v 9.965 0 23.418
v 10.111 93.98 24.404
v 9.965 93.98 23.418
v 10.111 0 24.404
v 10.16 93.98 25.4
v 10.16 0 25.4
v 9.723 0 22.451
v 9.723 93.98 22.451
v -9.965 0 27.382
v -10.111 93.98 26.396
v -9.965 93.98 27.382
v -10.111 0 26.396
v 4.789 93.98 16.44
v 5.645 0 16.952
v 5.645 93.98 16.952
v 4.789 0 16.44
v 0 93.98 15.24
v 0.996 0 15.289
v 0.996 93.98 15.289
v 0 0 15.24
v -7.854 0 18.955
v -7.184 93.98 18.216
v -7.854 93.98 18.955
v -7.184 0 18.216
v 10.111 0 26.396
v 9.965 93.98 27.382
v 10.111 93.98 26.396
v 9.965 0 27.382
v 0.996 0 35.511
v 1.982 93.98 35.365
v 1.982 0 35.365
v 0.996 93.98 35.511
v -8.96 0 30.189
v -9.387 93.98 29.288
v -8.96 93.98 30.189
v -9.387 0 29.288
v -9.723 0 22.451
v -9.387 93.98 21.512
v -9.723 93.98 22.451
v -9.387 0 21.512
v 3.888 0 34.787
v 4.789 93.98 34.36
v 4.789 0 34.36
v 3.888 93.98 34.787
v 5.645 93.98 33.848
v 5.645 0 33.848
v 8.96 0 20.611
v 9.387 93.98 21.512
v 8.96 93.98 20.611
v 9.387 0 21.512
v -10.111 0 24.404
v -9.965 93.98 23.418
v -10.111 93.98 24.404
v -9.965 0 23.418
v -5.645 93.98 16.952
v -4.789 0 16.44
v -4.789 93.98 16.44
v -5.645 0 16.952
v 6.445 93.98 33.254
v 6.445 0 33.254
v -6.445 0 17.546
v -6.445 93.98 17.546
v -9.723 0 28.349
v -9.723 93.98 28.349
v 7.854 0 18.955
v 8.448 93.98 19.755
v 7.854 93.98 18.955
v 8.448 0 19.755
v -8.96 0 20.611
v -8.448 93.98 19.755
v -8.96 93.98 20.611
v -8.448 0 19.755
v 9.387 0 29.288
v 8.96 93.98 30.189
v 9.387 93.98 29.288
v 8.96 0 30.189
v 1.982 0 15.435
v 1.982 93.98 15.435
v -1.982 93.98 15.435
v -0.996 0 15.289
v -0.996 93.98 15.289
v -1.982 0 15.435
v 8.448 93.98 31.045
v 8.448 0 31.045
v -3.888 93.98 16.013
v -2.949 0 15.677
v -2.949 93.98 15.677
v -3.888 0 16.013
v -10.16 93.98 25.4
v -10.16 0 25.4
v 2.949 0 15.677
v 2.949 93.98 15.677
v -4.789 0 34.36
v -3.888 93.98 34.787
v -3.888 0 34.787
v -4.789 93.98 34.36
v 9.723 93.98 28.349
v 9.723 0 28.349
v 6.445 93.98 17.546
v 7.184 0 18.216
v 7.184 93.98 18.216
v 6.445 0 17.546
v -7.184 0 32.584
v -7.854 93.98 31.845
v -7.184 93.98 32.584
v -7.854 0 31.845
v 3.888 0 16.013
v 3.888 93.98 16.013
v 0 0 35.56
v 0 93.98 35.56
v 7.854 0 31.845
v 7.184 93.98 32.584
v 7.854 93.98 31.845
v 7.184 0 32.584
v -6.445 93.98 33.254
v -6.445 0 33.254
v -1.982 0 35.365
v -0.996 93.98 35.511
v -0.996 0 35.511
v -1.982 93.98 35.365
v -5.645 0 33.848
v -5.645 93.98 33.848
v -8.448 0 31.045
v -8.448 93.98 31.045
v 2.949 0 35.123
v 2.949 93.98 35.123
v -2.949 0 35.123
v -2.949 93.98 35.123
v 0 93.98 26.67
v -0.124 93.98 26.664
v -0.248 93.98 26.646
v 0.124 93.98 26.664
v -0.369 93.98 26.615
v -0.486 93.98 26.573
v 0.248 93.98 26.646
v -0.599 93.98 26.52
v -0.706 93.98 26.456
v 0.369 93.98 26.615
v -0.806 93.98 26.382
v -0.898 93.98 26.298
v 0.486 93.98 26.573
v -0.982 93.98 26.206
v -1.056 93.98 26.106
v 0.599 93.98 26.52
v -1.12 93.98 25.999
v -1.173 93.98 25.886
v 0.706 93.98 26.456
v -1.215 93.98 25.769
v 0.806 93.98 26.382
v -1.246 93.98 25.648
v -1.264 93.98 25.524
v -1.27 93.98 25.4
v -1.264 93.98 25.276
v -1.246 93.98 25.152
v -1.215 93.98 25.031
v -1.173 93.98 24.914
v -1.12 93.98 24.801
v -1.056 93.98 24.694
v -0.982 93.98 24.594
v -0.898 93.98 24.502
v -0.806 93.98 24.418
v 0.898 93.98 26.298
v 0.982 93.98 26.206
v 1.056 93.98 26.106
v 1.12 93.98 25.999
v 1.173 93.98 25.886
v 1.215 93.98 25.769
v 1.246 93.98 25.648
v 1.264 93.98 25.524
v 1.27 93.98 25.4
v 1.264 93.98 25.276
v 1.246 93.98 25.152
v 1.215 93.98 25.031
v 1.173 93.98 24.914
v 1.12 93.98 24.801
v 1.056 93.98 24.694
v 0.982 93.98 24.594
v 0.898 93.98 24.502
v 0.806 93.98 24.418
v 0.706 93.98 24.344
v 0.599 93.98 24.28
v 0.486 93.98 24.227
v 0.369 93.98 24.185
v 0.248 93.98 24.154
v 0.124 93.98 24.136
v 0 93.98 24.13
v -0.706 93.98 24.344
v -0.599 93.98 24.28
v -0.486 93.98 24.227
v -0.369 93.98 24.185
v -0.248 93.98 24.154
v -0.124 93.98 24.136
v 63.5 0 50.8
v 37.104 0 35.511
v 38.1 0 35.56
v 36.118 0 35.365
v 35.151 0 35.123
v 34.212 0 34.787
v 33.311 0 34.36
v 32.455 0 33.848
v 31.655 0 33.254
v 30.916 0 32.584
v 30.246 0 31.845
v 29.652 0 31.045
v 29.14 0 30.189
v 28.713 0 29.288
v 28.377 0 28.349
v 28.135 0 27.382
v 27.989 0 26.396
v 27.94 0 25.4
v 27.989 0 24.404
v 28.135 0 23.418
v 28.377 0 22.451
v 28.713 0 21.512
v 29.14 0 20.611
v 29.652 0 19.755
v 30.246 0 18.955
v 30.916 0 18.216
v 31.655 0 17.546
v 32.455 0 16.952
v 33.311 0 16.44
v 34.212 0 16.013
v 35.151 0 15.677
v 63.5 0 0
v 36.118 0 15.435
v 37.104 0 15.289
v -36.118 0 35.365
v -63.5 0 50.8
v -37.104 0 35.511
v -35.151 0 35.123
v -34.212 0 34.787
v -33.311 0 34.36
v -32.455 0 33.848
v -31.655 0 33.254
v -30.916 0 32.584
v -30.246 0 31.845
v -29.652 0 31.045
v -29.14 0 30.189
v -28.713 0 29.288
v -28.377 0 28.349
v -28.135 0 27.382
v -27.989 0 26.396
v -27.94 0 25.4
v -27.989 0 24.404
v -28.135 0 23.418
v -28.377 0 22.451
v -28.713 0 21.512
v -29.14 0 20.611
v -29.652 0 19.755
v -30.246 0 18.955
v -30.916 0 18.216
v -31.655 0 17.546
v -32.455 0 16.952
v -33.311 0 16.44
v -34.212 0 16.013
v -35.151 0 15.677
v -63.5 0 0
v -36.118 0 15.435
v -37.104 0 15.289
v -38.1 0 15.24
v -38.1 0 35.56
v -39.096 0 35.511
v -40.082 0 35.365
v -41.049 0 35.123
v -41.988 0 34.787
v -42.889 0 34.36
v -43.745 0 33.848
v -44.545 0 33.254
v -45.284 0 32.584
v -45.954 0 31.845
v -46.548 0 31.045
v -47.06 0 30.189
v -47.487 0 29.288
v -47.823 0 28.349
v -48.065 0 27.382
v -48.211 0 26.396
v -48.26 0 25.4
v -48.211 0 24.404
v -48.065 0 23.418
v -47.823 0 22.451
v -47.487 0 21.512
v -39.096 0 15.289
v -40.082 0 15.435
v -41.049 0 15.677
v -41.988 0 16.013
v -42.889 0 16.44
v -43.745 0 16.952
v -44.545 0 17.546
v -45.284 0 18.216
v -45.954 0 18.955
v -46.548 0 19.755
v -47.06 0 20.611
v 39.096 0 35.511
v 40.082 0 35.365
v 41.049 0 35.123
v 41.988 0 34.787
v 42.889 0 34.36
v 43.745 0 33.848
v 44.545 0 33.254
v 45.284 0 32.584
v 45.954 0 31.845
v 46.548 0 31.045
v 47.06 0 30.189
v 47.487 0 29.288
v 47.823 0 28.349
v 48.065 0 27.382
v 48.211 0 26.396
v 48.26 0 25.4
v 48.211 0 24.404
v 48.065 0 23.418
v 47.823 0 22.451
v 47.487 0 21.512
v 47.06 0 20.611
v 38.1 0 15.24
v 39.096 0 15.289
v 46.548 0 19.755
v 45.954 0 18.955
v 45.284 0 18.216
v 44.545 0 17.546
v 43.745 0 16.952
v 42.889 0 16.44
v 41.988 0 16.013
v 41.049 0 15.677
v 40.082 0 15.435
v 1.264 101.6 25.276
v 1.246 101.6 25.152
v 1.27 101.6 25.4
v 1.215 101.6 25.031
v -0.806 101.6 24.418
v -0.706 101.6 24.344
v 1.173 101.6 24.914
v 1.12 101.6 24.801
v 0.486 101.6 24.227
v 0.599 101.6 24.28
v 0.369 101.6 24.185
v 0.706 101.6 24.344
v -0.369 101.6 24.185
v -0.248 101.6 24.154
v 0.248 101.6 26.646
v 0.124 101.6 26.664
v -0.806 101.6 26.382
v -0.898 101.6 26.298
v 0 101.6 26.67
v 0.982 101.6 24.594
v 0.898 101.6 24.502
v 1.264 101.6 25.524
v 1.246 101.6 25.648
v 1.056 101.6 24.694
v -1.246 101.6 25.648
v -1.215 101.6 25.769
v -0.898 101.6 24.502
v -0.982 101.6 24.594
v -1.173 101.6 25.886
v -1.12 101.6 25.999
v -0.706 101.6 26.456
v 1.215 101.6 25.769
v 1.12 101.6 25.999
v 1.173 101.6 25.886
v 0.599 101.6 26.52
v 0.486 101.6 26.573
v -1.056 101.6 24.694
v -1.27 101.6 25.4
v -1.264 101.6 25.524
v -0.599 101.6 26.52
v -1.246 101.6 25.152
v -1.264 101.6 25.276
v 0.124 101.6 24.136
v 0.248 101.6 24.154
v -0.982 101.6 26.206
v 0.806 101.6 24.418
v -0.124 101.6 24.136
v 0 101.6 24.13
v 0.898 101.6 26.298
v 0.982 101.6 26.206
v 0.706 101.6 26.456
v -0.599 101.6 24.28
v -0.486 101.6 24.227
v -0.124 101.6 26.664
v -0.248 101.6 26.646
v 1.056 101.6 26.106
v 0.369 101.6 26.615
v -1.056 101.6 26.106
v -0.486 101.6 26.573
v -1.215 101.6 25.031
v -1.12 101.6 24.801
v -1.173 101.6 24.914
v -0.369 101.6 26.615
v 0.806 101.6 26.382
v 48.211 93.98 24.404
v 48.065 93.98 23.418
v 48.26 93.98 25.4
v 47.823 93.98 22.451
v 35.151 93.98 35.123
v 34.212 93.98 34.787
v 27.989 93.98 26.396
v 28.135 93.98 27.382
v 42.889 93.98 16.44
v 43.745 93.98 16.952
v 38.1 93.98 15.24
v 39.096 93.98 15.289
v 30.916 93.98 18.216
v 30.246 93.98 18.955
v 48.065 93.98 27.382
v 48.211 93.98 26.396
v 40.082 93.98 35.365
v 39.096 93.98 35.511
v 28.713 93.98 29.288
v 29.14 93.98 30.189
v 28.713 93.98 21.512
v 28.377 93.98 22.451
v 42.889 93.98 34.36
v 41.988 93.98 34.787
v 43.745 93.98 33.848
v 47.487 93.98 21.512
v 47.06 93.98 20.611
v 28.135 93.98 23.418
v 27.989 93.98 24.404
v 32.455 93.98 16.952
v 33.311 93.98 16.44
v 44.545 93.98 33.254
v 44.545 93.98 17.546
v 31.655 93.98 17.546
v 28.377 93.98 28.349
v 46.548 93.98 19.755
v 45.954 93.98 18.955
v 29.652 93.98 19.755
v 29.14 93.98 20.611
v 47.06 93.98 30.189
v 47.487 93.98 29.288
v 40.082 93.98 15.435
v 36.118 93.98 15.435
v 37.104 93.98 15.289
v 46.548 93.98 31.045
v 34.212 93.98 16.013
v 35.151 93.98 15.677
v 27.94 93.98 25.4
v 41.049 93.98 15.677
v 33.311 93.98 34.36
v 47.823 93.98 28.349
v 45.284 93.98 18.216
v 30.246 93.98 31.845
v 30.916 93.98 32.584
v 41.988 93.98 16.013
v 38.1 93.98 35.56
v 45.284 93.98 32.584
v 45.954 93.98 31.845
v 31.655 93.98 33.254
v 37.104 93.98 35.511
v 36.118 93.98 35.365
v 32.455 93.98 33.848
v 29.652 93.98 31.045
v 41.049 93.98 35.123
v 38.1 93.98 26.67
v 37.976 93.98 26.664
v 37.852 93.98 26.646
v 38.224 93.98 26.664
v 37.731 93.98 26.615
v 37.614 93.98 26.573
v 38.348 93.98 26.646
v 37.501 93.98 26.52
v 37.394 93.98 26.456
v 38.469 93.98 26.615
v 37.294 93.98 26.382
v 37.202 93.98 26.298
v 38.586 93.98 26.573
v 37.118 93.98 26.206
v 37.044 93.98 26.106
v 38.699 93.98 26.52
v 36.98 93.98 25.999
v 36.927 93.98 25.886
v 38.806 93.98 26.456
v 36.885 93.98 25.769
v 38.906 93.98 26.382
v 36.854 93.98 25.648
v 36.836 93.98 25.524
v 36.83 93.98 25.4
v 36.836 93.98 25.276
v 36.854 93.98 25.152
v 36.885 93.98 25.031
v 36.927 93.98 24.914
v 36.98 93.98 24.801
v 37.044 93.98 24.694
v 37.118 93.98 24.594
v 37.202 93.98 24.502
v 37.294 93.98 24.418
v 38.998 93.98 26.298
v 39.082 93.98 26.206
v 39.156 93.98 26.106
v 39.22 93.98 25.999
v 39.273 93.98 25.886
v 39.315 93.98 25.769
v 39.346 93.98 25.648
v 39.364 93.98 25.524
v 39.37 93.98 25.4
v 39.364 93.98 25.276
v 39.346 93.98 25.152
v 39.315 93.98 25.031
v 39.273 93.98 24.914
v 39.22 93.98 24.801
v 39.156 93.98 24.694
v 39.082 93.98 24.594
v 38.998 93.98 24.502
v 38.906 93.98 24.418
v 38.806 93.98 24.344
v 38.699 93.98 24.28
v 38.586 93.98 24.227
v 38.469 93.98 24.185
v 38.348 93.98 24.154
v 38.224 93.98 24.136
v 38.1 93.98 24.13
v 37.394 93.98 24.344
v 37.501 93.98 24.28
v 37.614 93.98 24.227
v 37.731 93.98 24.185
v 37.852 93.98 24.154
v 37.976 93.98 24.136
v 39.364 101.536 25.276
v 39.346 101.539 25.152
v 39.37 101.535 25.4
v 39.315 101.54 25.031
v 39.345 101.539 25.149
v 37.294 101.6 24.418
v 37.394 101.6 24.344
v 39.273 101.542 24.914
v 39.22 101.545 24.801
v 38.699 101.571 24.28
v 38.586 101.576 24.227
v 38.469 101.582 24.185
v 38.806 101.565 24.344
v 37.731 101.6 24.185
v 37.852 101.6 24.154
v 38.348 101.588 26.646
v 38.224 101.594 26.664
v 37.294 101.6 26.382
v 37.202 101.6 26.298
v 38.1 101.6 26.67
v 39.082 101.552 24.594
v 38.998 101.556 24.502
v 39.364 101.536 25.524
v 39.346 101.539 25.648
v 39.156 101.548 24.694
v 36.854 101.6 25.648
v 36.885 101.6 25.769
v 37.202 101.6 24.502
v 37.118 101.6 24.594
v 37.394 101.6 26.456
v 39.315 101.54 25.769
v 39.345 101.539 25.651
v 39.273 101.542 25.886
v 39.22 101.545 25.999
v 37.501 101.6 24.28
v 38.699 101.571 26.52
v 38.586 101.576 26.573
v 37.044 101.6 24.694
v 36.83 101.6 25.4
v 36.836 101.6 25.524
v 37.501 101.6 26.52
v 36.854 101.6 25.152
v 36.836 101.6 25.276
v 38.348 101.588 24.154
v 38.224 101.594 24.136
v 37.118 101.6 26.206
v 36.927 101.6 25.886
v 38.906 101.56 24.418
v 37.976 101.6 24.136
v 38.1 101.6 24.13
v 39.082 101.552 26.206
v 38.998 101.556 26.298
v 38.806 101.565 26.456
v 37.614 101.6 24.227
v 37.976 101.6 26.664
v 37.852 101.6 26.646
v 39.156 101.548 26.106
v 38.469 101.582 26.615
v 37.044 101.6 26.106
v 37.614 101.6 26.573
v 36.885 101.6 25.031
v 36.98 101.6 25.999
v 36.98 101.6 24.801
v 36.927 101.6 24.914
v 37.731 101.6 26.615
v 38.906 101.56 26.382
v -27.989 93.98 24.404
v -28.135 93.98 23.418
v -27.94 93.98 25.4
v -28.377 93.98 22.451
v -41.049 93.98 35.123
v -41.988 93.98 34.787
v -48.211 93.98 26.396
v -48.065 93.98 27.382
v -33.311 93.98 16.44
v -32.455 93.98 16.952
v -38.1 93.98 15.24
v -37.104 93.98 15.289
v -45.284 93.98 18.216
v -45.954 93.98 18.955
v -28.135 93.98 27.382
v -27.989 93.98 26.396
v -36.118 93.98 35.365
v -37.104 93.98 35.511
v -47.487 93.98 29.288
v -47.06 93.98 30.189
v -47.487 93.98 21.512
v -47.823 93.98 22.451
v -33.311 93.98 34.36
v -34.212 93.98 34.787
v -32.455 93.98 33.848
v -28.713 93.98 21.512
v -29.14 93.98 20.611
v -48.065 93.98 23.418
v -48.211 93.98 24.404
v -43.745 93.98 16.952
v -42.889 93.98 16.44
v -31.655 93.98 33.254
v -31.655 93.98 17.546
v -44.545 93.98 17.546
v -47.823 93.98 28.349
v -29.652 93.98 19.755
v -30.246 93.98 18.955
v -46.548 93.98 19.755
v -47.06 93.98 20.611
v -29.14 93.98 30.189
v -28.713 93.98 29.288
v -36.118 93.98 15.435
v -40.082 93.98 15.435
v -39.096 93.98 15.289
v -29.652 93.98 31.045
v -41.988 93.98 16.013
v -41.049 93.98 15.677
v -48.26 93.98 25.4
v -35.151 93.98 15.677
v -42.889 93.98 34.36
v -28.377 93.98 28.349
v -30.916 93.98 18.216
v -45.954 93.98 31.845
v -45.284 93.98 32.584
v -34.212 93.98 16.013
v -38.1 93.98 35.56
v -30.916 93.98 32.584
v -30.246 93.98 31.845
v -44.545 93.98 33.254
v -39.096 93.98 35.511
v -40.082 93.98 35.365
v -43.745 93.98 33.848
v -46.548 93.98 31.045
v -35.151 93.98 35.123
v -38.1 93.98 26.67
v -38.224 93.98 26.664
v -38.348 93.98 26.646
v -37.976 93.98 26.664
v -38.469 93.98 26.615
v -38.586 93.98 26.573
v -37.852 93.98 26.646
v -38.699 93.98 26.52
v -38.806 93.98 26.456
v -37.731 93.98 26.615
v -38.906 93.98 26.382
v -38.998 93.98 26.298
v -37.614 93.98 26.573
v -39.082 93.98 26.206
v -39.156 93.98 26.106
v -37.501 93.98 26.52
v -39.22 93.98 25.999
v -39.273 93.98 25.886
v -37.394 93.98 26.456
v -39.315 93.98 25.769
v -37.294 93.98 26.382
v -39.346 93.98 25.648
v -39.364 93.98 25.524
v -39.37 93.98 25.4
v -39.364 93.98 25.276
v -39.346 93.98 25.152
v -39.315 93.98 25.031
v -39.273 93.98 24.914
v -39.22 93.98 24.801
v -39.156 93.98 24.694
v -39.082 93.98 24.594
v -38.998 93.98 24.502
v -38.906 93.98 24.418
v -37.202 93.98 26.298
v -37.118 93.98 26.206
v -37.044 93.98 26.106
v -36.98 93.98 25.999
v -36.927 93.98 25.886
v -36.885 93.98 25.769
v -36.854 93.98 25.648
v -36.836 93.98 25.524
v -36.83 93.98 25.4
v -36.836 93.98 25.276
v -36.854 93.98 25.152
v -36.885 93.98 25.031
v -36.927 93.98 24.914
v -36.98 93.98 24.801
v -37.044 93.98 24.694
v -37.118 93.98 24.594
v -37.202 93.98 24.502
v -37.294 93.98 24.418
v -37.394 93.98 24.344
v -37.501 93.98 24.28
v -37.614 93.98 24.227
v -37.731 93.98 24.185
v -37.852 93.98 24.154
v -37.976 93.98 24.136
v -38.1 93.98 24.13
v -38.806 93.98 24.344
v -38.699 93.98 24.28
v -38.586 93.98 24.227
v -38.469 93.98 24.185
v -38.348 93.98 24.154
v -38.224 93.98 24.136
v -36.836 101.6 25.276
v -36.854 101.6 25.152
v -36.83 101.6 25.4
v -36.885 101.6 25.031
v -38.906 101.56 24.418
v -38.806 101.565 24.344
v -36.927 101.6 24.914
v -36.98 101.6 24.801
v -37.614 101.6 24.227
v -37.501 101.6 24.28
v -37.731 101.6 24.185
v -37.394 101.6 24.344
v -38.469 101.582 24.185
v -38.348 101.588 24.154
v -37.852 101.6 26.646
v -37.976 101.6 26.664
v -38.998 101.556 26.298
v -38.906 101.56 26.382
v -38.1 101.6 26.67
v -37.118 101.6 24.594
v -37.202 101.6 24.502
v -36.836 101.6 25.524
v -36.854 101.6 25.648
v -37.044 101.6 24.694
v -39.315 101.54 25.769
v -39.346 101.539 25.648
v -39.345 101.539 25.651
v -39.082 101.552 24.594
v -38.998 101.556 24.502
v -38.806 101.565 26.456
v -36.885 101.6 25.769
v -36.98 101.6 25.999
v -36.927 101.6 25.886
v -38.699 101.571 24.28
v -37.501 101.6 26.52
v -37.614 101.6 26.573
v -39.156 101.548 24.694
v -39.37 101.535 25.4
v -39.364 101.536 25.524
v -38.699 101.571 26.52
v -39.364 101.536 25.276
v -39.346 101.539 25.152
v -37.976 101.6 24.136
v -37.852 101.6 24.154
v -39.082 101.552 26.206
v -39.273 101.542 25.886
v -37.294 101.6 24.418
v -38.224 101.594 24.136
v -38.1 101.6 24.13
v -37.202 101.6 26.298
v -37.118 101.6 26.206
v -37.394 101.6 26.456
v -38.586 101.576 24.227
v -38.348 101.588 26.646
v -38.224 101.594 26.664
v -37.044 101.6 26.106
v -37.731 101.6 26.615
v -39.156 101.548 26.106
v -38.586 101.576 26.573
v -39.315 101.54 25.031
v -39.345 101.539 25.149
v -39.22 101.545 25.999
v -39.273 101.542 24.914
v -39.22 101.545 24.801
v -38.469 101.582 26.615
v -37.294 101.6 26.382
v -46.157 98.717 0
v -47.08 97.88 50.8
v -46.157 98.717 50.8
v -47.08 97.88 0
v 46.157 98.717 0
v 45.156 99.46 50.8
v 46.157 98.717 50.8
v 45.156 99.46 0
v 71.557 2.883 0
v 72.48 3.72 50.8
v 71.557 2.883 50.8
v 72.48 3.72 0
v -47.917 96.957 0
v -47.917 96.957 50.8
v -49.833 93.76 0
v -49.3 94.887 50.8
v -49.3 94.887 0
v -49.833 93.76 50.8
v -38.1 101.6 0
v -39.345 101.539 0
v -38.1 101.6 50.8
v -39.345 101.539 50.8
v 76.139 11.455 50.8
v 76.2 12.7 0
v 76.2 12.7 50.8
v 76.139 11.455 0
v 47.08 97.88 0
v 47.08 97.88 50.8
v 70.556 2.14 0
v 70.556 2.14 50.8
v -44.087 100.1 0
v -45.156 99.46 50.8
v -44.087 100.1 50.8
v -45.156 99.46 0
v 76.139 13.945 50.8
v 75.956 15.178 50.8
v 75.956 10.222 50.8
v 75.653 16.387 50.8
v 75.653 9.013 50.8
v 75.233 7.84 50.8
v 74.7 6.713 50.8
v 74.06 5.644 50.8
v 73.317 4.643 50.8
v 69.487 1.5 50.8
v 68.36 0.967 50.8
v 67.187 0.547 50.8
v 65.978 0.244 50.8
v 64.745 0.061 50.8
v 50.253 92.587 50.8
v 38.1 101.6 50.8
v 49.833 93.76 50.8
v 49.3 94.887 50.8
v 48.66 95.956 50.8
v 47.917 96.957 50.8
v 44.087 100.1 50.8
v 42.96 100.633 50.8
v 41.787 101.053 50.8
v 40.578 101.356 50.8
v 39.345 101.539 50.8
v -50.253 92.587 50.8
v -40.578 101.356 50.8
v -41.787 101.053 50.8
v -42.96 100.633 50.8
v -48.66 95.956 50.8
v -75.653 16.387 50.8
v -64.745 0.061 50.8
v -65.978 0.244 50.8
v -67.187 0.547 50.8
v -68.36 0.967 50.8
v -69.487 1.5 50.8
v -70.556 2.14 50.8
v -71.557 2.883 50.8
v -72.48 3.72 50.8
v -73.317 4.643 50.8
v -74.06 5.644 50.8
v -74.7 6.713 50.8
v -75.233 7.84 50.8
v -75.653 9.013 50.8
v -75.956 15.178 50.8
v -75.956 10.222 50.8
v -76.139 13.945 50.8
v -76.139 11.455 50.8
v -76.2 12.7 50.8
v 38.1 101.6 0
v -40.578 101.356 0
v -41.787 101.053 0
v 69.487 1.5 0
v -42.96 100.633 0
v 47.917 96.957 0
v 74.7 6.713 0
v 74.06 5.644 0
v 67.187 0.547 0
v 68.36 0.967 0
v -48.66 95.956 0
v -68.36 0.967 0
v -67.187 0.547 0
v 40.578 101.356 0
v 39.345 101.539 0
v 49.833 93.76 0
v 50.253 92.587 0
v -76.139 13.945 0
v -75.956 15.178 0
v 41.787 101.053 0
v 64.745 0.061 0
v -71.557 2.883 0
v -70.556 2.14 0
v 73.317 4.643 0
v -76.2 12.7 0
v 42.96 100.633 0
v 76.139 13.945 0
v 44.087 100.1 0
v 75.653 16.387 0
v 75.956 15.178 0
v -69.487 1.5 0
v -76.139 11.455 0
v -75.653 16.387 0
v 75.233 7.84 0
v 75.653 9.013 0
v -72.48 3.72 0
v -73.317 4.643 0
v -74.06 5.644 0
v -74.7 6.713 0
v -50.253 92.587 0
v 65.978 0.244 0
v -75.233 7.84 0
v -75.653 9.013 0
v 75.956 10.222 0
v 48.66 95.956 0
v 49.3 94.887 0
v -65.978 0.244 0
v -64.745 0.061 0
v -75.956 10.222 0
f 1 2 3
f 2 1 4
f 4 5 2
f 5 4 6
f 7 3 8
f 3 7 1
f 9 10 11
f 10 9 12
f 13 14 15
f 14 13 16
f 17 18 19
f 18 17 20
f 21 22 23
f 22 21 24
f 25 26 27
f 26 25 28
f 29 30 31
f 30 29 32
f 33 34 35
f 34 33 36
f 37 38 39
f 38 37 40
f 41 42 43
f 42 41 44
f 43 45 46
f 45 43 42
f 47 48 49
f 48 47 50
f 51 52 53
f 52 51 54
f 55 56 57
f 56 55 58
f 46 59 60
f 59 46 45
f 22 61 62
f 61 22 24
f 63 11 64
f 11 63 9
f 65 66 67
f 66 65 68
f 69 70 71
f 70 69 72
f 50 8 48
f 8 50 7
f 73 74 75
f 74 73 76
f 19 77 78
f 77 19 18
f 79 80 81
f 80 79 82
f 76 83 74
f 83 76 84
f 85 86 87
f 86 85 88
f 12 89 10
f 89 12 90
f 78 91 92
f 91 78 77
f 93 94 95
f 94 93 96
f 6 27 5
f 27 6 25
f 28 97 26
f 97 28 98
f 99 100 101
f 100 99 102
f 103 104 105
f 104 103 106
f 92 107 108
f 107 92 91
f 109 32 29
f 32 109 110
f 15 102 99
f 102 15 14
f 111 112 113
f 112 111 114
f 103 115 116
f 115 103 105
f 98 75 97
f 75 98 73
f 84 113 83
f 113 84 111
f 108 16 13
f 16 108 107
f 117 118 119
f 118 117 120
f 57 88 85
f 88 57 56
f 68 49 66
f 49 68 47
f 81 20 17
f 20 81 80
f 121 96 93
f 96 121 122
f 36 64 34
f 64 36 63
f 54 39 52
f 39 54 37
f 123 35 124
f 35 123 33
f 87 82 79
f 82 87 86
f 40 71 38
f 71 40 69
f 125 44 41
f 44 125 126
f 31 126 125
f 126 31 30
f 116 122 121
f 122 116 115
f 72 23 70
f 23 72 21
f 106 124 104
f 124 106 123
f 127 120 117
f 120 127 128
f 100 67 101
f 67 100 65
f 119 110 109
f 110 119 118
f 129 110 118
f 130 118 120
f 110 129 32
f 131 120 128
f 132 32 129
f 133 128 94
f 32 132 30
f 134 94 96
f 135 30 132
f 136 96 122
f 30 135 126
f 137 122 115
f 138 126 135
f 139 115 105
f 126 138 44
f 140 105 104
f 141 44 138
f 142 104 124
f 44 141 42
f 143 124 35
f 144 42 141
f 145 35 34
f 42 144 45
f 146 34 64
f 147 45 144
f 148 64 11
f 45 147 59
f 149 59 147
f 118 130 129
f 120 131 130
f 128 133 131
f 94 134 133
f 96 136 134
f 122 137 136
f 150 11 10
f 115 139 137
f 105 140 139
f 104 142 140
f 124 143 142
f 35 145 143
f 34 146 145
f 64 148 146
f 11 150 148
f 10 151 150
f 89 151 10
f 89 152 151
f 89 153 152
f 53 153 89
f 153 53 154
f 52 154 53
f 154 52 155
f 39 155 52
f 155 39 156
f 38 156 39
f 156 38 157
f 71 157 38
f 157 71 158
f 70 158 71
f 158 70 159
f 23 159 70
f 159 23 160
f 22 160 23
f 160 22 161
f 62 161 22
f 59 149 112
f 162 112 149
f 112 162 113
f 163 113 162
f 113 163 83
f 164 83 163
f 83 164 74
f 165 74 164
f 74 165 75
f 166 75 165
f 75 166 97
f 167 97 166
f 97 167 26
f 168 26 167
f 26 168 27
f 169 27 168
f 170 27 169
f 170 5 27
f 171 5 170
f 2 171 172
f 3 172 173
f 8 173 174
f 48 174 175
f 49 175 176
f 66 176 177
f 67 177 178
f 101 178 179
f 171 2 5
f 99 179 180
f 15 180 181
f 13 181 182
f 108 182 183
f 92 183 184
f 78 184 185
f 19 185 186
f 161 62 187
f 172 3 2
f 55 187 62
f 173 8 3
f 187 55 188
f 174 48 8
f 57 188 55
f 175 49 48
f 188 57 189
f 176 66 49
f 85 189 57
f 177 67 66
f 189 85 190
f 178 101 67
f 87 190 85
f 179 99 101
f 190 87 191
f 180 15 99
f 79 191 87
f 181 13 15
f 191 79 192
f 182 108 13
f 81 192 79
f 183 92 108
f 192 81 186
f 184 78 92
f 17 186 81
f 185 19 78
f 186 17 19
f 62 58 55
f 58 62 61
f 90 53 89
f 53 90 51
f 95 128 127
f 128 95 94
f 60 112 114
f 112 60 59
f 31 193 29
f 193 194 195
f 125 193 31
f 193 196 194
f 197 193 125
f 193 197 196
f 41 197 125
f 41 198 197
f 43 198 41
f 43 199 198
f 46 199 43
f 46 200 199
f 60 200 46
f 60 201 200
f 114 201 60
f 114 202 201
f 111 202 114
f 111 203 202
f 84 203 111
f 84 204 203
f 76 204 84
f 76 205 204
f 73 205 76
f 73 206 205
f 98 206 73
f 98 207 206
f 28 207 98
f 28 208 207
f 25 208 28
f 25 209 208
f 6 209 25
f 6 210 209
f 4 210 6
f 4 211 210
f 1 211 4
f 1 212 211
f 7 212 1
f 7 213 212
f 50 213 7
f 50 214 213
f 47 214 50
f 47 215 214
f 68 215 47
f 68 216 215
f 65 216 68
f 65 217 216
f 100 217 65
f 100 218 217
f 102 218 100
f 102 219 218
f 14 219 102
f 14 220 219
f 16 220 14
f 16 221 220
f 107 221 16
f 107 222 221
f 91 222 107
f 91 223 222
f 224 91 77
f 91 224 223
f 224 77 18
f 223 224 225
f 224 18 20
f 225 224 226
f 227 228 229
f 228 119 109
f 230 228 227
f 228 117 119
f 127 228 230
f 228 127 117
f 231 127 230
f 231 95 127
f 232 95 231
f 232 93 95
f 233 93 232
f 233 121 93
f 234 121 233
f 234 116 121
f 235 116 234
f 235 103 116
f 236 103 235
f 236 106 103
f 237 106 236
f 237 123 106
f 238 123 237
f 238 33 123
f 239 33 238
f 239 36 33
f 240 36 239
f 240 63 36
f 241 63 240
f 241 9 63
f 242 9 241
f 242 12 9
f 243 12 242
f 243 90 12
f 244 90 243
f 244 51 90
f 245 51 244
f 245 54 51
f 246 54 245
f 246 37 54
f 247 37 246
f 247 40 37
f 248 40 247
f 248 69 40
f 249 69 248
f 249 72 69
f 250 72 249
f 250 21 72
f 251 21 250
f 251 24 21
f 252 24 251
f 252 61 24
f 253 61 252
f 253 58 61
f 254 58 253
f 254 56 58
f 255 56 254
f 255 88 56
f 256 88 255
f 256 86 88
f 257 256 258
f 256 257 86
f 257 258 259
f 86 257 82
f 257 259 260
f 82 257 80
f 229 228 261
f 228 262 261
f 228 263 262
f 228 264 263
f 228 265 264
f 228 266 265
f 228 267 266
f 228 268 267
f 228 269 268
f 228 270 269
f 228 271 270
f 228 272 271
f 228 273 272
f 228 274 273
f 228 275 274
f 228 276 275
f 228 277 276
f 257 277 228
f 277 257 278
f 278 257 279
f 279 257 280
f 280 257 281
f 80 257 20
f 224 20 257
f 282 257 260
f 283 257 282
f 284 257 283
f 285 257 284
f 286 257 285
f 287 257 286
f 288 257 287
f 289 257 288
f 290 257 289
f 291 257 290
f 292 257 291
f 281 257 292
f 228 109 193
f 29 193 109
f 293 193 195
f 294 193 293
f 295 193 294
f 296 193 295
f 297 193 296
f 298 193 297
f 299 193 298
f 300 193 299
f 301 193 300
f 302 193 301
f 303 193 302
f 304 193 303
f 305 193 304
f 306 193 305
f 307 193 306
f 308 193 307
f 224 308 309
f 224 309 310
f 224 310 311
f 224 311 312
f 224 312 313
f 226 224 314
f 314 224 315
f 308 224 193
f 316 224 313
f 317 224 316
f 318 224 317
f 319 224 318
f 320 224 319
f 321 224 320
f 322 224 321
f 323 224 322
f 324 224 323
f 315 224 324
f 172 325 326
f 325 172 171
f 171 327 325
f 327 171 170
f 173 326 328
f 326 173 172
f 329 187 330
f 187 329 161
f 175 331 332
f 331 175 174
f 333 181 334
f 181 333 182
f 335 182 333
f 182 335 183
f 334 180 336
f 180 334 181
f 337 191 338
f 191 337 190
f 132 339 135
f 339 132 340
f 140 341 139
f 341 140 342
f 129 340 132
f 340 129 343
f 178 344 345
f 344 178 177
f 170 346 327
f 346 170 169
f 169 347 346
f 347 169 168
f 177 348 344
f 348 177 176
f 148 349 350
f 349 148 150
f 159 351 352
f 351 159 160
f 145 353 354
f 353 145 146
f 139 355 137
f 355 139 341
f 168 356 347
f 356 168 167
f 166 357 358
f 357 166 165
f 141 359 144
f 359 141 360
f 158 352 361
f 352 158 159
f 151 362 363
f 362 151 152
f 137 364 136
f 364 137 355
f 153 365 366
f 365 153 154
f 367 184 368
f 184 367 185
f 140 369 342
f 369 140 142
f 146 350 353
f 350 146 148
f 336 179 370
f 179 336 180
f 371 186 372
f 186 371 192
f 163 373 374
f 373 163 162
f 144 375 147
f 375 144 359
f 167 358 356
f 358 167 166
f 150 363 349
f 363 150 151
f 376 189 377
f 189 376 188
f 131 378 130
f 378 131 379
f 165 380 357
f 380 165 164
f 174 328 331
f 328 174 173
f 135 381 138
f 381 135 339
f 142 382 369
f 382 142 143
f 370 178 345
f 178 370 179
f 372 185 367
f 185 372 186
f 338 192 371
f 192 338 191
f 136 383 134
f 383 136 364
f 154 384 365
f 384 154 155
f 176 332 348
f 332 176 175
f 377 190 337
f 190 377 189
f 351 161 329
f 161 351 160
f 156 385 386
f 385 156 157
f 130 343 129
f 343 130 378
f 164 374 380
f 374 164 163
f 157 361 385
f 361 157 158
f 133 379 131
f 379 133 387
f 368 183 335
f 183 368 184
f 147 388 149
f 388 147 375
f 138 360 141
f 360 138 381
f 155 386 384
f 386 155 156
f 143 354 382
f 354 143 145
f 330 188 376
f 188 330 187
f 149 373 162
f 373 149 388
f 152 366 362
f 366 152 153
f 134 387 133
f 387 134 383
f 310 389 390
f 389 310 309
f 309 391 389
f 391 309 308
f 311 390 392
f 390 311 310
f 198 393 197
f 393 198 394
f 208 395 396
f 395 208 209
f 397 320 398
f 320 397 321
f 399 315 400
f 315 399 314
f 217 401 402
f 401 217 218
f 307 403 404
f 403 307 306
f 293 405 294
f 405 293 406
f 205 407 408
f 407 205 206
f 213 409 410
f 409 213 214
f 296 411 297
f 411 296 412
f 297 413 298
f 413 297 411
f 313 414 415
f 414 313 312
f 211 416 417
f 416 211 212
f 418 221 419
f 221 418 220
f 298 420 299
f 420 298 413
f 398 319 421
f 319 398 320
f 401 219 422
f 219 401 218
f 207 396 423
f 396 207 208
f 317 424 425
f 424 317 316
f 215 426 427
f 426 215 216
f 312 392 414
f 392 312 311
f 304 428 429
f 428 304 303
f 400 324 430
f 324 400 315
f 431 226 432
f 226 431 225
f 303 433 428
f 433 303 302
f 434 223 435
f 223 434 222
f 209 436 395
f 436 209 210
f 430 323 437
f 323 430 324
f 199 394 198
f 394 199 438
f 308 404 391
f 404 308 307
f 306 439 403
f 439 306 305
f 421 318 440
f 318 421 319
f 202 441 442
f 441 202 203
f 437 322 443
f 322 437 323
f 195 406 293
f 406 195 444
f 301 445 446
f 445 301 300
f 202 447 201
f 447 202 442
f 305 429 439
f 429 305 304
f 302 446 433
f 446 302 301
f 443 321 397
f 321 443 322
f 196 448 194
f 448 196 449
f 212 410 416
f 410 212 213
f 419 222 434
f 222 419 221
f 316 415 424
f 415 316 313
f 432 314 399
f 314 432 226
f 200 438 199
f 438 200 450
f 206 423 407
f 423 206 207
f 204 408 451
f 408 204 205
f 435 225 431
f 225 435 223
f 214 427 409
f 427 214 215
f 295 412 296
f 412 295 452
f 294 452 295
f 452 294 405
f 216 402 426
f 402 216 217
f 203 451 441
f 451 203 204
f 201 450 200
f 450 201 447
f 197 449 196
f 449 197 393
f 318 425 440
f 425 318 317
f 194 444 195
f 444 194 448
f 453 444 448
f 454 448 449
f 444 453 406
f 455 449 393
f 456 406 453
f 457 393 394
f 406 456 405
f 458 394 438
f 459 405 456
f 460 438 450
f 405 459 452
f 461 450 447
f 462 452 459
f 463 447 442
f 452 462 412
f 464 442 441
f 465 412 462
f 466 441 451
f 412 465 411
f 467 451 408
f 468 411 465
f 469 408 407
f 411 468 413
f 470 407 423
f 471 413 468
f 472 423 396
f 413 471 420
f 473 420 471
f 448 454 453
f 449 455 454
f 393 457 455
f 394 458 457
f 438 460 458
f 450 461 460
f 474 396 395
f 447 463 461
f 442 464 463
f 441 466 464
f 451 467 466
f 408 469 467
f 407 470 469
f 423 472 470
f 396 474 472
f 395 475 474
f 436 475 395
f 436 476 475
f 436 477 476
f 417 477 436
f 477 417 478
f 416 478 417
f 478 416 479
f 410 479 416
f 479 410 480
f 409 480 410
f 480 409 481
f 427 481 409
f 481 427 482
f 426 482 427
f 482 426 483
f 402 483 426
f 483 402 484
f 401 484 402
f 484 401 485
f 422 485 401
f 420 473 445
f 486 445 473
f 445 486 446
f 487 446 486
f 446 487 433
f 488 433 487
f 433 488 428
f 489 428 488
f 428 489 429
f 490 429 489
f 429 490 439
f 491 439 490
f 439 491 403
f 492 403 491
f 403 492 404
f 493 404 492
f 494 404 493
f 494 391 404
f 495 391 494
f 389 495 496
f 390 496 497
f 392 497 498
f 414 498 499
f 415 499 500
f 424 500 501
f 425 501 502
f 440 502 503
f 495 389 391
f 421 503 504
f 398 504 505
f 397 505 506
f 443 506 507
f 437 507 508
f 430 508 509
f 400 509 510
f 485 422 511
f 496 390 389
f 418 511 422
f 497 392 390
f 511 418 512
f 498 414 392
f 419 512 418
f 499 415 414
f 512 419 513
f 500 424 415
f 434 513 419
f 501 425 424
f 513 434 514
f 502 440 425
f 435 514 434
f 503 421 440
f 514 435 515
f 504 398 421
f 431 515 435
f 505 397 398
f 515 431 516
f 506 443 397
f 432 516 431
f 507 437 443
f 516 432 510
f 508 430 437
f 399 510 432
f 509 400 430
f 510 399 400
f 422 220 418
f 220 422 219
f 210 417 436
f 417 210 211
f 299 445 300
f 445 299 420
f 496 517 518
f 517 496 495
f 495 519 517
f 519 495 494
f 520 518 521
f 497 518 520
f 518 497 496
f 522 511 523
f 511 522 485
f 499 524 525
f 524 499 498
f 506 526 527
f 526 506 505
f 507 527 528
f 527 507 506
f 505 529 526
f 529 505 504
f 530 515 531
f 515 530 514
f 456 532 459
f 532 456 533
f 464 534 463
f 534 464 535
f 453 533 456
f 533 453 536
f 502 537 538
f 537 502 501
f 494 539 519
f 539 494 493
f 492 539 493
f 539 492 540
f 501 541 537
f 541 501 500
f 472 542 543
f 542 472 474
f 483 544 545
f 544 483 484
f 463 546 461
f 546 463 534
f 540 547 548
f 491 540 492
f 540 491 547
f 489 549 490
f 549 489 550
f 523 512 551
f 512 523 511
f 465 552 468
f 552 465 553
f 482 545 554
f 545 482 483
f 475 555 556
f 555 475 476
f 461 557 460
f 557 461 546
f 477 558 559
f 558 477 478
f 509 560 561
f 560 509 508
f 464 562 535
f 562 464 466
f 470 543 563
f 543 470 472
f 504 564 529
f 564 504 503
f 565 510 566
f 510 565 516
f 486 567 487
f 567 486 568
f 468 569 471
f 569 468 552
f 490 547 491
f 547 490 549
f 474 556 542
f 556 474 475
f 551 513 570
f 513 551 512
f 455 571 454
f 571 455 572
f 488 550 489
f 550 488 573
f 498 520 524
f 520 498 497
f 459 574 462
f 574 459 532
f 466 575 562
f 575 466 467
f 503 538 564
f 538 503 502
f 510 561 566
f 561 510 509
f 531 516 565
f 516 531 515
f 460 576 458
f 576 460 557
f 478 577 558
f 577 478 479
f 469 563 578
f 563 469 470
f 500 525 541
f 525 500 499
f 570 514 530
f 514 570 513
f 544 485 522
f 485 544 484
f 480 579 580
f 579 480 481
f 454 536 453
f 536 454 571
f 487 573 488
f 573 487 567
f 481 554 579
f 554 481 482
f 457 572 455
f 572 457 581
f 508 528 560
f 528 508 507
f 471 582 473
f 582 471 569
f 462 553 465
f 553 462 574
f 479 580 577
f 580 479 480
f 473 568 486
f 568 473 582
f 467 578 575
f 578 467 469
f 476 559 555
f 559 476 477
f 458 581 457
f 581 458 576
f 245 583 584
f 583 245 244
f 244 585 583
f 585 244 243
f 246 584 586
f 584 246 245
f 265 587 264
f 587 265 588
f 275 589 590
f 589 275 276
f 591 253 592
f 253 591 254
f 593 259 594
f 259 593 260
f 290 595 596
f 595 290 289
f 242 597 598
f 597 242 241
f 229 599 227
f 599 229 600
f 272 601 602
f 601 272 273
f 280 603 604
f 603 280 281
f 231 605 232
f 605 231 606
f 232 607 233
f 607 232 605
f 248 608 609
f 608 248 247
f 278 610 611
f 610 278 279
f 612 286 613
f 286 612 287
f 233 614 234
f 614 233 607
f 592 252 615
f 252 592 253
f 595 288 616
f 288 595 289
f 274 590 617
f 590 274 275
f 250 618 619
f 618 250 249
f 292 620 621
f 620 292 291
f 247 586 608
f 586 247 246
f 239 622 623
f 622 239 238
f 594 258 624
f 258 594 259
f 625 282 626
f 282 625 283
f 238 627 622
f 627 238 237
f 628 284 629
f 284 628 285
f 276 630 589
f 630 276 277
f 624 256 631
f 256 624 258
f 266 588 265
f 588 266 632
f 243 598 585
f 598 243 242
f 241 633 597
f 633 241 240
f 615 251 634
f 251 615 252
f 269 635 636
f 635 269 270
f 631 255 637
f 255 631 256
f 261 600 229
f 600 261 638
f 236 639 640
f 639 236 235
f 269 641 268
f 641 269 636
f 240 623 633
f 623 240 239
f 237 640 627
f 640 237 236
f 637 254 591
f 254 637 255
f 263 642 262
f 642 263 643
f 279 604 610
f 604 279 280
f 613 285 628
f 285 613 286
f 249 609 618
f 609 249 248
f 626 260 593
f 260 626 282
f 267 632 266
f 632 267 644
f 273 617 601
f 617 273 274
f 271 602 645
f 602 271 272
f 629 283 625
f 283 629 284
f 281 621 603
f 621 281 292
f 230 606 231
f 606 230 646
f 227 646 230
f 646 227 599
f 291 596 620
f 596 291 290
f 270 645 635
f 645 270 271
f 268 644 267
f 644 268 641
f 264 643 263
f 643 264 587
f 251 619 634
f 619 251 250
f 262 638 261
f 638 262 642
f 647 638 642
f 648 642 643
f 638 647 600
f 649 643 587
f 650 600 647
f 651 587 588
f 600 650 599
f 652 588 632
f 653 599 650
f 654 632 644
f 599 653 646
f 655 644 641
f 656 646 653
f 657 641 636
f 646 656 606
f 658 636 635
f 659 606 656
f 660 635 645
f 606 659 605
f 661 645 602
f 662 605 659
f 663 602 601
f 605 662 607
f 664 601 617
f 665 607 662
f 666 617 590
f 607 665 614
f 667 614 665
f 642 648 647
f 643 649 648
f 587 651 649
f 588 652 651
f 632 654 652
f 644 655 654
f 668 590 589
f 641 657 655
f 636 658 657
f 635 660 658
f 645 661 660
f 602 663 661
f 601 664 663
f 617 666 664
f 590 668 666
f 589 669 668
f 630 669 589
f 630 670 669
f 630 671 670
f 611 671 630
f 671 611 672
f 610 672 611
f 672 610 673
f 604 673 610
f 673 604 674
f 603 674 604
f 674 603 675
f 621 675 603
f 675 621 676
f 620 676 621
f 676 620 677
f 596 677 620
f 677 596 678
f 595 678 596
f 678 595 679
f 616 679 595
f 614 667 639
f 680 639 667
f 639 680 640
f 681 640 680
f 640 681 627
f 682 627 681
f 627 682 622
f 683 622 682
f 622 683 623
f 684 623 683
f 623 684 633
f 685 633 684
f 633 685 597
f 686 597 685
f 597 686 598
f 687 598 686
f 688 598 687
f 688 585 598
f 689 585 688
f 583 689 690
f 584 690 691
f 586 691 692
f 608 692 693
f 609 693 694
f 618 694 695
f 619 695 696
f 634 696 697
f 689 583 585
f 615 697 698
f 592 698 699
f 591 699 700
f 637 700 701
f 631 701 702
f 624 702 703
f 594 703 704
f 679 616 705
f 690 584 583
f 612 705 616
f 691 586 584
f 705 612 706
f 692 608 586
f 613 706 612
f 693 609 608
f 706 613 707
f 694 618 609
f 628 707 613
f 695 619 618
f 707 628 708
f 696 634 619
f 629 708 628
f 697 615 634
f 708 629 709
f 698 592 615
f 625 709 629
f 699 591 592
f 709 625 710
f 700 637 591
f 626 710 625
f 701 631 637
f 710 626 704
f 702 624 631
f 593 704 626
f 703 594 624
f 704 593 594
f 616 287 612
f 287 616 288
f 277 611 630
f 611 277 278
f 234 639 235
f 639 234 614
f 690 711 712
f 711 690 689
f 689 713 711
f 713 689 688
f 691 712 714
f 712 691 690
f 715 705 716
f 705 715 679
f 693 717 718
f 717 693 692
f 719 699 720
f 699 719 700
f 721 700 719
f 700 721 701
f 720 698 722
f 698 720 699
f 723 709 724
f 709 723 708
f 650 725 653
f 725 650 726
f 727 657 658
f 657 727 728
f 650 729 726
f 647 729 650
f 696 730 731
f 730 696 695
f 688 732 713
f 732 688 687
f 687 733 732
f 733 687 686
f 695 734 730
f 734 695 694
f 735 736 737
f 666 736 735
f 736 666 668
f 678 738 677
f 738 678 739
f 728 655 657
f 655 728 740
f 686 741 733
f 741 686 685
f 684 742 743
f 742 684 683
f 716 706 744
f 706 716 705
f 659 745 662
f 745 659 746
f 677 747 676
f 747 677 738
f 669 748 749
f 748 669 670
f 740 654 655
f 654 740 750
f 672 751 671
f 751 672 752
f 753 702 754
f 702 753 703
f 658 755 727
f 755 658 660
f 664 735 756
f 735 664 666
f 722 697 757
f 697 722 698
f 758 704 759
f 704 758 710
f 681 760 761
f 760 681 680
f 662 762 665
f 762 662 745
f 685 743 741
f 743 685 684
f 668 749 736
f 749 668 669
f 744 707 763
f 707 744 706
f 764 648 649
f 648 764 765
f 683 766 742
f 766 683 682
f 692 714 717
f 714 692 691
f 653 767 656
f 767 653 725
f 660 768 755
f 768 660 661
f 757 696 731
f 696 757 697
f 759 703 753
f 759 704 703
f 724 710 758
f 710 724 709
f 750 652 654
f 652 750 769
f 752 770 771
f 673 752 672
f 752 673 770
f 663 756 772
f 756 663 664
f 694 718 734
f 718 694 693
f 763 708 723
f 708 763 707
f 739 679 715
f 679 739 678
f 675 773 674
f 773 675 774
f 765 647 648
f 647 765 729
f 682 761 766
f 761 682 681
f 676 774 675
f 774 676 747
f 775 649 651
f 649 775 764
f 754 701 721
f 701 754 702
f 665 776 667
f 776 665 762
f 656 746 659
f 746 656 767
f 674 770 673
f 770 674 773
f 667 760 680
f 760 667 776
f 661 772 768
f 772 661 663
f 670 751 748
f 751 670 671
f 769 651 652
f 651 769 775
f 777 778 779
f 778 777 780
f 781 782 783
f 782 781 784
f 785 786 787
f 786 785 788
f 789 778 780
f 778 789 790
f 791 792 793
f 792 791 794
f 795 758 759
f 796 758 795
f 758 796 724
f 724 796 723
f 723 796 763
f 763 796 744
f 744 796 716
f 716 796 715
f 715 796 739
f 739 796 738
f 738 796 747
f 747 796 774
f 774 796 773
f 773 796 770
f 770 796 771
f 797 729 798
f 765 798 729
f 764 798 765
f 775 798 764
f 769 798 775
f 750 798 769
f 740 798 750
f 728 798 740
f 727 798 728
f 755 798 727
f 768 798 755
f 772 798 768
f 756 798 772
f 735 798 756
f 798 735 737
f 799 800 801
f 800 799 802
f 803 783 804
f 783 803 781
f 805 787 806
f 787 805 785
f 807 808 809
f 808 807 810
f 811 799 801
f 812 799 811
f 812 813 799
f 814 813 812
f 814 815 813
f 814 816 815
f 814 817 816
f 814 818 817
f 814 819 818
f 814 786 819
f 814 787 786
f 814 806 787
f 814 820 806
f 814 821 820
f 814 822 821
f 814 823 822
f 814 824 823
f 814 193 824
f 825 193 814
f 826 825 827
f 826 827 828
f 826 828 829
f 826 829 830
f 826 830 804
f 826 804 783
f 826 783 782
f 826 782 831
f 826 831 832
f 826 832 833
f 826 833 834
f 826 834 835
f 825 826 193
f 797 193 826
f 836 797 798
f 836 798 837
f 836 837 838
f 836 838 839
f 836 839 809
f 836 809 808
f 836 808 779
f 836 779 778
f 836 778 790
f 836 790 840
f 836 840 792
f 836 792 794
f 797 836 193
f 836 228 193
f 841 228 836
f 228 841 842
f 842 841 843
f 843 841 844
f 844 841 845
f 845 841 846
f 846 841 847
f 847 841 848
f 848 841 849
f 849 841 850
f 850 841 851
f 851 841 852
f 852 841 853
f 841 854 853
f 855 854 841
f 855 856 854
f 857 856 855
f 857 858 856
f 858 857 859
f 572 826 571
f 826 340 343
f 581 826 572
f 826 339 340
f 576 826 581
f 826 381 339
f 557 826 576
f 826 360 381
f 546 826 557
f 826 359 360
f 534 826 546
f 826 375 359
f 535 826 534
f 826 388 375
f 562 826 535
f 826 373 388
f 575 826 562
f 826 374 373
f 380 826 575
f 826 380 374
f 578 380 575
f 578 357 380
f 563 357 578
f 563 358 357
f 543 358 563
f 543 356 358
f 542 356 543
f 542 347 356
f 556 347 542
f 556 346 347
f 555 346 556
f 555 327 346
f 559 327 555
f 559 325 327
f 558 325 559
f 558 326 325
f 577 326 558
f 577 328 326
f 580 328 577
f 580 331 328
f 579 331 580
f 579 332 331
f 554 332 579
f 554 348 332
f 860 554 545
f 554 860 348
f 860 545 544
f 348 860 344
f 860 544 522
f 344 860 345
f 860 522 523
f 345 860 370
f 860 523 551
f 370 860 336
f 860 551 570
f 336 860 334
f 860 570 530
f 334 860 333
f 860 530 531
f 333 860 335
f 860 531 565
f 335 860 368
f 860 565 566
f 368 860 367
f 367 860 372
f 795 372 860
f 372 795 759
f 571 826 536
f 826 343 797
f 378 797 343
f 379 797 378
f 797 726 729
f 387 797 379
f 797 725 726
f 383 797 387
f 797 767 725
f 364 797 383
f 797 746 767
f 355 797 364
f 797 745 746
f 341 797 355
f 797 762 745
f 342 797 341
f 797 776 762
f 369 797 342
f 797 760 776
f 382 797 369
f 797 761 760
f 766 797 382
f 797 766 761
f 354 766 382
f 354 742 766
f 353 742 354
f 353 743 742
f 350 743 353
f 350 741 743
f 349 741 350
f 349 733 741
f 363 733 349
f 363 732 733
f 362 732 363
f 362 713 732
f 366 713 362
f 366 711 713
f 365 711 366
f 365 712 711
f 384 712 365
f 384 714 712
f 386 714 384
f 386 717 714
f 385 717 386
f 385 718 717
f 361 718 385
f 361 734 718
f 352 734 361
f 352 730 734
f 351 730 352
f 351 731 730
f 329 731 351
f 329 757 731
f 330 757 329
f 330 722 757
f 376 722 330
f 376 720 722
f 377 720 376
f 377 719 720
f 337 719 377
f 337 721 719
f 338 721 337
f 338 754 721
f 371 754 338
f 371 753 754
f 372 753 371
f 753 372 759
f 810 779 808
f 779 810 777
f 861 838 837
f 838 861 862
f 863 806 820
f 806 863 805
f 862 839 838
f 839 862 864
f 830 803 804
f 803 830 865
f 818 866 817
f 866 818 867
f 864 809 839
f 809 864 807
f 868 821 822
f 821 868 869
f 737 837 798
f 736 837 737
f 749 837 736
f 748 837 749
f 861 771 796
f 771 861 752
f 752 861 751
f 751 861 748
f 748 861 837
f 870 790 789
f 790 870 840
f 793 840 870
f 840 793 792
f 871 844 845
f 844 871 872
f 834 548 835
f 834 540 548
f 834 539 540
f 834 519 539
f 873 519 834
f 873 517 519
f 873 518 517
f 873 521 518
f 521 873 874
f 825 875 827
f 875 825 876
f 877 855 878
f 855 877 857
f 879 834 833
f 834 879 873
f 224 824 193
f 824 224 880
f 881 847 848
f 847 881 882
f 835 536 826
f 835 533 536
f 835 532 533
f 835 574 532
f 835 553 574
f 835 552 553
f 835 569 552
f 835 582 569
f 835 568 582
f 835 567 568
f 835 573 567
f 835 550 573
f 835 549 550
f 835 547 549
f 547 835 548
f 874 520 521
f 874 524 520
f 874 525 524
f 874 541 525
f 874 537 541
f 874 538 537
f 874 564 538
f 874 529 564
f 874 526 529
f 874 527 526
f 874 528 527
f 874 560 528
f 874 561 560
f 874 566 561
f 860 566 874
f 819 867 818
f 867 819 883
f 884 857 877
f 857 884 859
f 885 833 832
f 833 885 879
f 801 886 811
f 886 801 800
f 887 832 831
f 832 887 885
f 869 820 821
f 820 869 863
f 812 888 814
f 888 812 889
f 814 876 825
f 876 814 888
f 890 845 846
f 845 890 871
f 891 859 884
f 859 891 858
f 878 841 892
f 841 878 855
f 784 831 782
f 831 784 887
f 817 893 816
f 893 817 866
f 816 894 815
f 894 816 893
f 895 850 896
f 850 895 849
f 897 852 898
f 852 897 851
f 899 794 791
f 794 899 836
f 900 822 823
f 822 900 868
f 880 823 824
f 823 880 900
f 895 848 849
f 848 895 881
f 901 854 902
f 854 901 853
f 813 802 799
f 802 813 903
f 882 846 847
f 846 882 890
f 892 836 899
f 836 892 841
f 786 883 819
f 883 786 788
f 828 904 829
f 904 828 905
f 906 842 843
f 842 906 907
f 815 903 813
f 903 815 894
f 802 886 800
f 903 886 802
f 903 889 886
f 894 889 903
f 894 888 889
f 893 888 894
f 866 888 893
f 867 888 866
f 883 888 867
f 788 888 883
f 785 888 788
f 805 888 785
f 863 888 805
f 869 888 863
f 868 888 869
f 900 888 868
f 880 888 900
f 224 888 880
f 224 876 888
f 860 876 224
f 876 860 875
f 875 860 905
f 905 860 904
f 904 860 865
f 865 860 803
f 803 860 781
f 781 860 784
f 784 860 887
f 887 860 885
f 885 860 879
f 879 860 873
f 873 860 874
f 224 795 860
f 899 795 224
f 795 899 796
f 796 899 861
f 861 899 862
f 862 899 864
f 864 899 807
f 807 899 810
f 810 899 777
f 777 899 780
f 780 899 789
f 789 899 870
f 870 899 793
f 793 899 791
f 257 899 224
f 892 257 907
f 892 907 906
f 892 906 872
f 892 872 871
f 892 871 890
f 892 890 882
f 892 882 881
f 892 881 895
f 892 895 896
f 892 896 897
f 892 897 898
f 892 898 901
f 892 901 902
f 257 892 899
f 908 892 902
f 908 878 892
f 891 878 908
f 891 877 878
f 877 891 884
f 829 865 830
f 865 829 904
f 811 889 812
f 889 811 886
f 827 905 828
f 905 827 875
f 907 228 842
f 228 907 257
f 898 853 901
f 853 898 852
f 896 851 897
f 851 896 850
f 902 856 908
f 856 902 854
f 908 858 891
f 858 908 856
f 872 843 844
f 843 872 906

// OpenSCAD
// foot for new pink couch! ~H 2018-02-19
// h=4
// 1/2b = 3
// 1/2w = 2


$fn=64;
x = 25.4;

difference() {

linear_extrude(height=2*x) {  
minkowski() {
    polygon([
        [-1.5*x, 3.5*x],
        [1.5*x, 3.5*x],
        [2.5*x, .5*x],
        [-2.5*x, .5*x]
        ]);
    
    
    circle(r=.5*x);
};
};
 pilot_hole();
translate([1.5*x, 0,0])
pilot_hole();
translate([-1.5*x, 0,0])
pilot_hole();
};

module pilot_hole() {
    
translate([0,0,x])
rotate([-90,0,0])
cylinder(r=.4*x, h=x*3.7);

translate([0,0,x])
rotate([-90,0,0])
cylinder(r=.05*x, h=4*x);
}
